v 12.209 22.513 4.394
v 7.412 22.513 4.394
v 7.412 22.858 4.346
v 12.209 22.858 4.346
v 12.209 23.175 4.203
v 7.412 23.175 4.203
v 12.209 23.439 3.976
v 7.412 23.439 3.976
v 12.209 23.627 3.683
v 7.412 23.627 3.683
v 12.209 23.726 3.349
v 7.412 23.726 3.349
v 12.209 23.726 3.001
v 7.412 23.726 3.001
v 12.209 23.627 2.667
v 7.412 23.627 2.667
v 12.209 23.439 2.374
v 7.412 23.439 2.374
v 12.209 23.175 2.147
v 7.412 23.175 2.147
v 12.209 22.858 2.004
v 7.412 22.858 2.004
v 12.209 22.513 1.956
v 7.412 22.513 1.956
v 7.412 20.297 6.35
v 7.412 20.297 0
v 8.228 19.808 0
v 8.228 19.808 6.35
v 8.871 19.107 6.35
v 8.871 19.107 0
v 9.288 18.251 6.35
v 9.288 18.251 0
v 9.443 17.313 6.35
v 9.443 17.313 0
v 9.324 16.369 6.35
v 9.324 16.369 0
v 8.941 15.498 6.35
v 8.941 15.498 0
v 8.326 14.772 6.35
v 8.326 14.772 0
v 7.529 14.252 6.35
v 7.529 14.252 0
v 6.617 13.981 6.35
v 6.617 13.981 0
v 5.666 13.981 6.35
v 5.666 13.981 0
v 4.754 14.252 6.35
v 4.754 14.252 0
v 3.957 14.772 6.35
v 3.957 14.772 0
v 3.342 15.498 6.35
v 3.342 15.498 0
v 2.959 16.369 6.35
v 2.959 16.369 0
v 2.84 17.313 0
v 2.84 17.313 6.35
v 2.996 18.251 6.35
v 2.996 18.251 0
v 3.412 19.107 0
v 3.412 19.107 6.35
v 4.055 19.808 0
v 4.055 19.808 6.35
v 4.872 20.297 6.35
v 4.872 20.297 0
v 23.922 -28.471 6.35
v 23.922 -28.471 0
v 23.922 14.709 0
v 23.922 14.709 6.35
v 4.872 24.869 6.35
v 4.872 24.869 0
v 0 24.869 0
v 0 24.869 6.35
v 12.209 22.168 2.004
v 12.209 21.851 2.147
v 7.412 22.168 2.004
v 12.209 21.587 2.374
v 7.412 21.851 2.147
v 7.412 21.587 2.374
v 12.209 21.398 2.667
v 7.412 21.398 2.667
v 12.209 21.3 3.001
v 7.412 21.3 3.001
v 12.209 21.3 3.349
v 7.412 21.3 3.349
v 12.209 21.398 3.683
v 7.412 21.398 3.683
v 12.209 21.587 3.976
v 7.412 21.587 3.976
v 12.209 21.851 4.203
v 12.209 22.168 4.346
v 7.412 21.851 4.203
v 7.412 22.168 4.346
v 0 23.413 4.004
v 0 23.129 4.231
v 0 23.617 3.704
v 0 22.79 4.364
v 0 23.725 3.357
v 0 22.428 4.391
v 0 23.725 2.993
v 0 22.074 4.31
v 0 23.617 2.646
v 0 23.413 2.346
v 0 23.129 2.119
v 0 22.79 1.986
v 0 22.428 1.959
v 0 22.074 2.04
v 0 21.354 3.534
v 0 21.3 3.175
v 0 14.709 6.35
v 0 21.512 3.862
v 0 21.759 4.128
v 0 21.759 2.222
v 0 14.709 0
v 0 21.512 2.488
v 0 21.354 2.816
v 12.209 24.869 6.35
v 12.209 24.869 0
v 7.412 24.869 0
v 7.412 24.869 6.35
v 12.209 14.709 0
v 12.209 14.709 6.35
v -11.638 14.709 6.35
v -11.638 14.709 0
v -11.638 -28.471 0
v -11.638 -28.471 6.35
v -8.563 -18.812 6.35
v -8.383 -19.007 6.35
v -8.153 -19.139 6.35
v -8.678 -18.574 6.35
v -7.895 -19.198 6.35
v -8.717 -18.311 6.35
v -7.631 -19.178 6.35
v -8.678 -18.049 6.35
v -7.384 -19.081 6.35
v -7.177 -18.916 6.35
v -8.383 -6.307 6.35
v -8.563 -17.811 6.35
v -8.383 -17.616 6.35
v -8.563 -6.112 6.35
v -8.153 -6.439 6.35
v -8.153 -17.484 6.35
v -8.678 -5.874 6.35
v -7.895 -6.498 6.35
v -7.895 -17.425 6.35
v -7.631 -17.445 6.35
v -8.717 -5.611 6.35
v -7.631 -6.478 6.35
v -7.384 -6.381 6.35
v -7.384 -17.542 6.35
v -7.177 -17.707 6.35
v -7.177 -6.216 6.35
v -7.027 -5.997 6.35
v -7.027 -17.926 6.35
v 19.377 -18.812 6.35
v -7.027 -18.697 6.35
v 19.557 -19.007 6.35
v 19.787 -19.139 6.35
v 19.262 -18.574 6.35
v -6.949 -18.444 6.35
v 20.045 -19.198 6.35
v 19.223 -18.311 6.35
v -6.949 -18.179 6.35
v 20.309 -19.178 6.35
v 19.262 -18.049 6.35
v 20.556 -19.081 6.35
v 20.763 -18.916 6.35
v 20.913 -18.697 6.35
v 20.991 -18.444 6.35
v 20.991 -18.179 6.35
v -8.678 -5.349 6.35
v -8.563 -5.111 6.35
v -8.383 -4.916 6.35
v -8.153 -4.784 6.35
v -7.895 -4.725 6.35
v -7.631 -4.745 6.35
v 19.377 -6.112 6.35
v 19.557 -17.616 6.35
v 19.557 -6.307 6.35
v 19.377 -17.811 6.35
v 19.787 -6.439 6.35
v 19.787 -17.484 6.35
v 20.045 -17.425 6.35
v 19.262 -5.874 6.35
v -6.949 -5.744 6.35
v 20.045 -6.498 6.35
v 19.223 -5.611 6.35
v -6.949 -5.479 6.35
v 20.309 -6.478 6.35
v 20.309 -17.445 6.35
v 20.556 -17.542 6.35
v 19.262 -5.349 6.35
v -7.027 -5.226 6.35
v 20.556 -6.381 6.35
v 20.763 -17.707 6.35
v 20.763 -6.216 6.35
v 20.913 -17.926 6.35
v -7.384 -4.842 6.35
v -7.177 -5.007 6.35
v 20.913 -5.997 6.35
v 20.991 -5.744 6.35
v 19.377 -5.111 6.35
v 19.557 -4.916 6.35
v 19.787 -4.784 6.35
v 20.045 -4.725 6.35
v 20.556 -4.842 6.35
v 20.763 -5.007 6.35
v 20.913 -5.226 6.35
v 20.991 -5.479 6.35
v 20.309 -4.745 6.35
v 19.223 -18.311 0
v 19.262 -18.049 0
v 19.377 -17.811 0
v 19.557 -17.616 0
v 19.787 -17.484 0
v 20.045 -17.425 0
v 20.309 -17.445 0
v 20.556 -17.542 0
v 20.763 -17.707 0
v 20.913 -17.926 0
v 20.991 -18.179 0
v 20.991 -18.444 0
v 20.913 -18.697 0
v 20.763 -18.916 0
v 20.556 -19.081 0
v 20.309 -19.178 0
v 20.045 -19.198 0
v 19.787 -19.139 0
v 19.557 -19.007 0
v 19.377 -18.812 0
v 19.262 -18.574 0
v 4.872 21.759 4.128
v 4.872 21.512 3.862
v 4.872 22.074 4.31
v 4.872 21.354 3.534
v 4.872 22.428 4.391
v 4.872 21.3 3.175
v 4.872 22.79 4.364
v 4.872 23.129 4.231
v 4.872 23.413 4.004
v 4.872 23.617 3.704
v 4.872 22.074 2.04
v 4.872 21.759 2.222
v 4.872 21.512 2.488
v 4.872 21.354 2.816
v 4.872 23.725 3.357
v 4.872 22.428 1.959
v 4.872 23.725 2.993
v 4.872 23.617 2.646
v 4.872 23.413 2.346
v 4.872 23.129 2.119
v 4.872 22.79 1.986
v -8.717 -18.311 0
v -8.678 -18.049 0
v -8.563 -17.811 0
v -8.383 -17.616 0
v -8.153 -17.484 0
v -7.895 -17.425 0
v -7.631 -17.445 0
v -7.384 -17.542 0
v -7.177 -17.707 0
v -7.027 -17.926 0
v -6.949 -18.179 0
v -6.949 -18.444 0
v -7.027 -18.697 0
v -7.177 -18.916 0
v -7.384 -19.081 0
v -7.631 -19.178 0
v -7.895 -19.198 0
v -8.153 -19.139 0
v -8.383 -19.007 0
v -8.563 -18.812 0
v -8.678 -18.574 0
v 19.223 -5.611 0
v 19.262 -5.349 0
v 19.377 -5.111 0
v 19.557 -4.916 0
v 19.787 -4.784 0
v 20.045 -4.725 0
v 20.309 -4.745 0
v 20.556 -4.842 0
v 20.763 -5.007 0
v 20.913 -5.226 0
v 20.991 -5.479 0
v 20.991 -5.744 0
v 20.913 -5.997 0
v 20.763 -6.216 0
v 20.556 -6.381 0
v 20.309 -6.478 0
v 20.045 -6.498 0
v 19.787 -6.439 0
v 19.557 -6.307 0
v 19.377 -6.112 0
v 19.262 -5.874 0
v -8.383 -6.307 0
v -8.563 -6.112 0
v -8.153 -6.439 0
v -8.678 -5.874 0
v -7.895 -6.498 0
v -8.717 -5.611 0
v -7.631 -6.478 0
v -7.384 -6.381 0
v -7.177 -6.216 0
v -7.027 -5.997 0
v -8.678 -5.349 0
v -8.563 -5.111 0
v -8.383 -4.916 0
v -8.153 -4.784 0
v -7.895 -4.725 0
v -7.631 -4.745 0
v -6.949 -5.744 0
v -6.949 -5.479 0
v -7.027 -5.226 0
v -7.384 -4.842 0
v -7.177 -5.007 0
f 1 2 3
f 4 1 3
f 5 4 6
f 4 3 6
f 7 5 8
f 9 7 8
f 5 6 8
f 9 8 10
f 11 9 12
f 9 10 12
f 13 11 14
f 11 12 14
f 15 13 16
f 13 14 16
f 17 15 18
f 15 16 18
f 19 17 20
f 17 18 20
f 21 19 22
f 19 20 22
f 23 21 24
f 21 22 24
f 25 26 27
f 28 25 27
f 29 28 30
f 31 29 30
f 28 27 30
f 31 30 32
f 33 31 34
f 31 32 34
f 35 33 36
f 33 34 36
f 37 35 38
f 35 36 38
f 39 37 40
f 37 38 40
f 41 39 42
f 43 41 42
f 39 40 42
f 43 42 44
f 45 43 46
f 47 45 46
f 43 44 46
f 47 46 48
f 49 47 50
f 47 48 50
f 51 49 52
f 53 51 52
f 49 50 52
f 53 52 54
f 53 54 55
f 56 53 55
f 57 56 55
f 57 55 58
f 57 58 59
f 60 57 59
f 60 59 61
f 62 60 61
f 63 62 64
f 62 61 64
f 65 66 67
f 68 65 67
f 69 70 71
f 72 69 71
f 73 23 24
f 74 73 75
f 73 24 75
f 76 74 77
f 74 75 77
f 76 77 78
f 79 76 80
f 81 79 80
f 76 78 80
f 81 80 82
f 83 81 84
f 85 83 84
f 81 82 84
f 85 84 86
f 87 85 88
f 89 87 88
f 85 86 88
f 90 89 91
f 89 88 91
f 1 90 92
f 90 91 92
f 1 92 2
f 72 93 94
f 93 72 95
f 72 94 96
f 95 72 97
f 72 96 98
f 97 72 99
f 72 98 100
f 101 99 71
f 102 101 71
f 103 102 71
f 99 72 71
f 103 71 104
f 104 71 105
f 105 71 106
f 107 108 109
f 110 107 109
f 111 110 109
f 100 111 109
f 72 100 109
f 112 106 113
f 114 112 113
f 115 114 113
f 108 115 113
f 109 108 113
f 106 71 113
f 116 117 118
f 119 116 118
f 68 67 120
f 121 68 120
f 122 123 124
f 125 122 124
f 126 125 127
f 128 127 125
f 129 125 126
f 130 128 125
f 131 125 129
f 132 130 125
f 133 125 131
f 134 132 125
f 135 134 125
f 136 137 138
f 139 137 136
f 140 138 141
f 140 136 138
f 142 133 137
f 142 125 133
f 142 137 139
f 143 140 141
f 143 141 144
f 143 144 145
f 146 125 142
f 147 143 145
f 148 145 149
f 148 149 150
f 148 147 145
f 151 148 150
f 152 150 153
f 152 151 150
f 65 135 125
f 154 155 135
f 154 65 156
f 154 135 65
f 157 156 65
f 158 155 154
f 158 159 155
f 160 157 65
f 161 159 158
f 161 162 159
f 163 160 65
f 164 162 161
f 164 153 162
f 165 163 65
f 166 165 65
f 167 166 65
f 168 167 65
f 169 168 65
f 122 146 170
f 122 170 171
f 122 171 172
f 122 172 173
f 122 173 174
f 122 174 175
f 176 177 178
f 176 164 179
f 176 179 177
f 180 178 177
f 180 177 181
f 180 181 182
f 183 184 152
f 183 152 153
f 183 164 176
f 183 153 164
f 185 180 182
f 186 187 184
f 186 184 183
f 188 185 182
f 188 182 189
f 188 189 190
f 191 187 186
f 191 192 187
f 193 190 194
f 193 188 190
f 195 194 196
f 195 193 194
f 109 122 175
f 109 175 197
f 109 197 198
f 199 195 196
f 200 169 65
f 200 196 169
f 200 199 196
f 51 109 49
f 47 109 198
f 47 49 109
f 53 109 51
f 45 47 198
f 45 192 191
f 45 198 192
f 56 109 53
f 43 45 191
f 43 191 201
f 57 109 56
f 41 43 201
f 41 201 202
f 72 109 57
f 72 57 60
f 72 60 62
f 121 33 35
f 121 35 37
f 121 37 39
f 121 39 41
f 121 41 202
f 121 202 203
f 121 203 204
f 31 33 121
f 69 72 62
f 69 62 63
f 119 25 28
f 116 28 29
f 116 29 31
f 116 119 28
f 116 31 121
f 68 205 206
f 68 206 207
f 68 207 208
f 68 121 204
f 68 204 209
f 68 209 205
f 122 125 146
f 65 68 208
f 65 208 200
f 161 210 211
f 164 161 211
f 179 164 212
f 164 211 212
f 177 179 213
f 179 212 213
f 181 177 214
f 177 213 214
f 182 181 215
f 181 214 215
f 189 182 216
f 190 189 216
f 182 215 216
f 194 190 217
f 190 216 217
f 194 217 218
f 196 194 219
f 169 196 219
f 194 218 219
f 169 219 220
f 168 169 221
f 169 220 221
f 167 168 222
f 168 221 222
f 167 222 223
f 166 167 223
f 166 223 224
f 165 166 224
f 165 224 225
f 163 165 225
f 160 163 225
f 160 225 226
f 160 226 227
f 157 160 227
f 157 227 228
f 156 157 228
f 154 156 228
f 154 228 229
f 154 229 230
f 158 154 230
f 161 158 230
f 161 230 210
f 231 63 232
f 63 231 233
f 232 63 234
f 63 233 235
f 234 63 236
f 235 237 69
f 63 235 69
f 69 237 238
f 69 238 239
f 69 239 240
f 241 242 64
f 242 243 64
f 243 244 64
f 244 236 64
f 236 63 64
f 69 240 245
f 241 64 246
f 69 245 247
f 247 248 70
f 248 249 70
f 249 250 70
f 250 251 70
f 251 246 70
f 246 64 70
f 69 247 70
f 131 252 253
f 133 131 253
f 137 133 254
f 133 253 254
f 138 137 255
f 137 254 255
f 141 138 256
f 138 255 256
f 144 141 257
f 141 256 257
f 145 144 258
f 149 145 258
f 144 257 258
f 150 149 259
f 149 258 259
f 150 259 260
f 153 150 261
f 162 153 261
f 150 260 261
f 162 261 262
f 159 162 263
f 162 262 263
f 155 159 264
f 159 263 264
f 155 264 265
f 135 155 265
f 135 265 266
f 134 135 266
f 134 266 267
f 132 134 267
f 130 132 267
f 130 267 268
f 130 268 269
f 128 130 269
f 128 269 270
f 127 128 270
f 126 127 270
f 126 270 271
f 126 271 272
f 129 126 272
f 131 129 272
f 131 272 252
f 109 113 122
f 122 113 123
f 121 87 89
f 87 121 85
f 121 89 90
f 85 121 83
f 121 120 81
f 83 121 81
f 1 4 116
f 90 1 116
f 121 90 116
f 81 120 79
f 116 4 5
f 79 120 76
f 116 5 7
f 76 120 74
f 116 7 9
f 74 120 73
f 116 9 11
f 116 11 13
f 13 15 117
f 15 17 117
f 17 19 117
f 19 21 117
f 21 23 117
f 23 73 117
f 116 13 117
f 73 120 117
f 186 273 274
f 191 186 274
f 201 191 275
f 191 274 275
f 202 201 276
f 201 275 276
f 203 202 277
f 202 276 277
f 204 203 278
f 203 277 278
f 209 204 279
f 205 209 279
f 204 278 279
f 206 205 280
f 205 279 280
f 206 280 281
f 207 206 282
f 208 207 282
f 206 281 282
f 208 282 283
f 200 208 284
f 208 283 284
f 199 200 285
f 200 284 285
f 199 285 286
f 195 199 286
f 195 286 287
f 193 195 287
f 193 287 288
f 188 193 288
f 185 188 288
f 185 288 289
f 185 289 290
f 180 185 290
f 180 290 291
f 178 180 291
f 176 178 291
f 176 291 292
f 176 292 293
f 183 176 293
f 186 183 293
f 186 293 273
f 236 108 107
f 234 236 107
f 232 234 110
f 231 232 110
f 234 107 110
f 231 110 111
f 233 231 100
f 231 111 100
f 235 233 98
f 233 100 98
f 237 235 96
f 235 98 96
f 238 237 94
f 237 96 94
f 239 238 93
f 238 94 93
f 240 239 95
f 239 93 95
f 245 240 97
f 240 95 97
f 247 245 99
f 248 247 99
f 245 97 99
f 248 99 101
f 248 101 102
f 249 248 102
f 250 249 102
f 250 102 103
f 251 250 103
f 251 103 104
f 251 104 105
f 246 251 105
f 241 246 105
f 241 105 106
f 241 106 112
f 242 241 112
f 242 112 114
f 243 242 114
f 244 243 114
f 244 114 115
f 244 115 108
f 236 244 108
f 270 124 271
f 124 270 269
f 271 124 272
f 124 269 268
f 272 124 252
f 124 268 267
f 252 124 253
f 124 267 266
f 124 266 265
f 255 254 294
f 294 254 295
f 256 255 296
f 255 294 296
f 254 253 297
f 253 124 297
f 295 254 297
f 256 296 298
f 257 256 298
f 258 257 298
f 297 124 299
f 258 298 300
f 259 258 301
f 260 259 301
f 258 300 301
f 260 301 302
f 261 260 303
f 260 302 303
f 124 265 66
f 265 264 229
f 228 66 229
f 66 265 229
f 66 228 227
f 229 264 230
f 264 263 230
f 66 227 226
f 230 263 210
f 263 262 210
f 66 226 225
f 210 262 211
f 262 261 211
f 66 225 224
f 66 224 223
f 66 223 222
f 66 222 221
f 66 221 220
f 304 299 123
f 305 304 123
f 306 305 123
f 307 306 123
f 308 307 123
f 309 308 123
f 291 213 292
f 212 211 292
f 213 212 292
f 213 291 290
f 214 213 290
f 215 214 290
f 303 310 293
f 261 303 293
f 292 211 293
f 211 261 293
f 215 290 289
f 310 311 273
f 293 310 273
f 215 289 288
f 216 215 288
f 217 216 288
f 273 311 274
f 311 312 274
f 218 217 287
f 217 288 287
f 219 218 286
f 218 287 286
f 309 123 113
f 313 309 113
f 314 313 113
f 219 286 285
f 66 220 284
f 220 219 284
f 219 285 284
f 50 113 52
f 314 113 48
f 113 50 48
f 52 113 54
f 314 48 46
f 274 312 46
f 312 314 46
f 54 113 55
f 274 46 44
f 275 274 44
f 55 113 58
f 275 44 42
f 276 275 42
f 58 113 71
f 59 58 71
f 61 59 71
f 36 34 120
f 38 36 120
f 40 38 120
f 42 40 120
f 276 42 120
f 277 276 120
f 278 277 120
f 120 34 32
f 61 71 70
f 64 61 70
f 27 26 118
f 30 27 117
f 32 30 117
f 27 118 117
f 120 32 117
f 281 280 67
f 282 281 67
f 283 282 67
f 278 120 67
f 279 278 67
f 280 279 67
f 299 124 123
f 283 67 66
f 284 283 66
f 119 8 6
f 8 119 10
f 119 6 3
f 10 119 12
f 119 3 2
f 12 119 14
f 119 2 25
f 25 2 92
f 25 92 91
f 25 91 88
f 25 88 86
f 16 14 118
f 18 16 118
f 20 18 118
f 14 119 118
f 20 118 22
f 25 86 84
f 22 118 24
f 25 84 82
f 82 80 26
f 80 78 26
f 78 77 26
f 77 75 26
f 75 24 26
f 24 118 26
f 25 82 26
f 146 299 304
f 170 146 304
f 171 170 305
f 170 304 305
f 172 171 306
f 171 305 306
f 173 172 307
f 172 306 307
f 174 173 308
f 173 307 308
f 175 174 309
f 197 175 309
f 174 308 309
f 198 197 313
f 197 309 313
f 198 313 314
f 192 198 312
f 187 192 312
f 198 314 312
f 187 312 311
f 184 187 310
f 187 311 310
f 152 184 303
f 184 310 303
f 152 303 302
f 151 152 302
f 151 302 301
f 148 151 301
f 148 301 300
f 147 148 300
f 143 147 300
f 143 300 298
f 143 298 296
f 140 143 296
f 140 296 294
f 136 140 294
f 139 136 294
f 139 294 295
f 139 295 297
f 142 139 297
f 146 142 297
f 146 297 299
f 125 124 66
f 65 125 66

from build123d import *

# Parameters (mm, degrees)
F1_DEPTH = 6.35
F3_D     = 1.778
F5_D     = 2.4384
F5_DEPTH = 5.08
F5_TIP   = 0.7325692667
F7_D     = 2.4384
F7_DEPTH = 25.4
F7_START = 7.3375843
F7_TIP   = 0.7325692667


with BuildPart() as f1:
    # F0 (on Top) → F1 (new body)
    with BuildSketch(Plane.XY):
        with BuildLine():
            Line((0, 14.708516188), (-11.6383890907, 14.708516188))
            Line((-11.6383890907, 14.708516188), (-11.6383890907, -28.471483812))
            Line((-11.6383890907, -28.471483812), (23.9216109093, -28.471483812))
            Line((23.9216109093, -28.471483812), (23.9216109093, 14.708516188))
            Line((23.9216109093, 14.708516188), (12.2091952547, 14.708516188))
            Line((12.2091952547, 14.708516188), (12.2091952547, 24.868516188))
            Line((12.2091952547, 24.868516188), (7.4116109093, 24.868516188))
            Line((7.4116109093, 24.868516188), (7.4116109093, 20.296516188))
            ThreePointArc((7.4116109093, 20.296516188), (6.1416109093, 13.946516188), (4.8716109093, 20.296516188))
            Line((4.8716109093, 20.296516188), (4.8716109093, 24.868516188))
            Line((4.8716109093, 24.868516188), (0, 24.868516188))
            Line((0, 24.868516188), (0, 14.708516188))
        make_face()
    extrude(amount=F1_DEPTH)

    # F3 (through all)
    with Locations(Plane.XY.offset(6.35)):
        with Locations((-7.8283890907, -5.611483812), (20.1116109093, -5.611483812), (20.1116109093, -18.311483812), (-7.8283890907, -18.311483812)):
            Hole(F3_D / 2)

    # F5
    with Locations(Plane.YZ.offset(12.2091952547)):
        with Locations((22.506316188, 3.175)):
            Hole(F5_D / 2, depth=F5_DEPTH)
            with Locations((0, 0, -(F5_DEPTH + F5_TIP / 2))):  # 118° drill point
                Cone(0, F5_D / 2, F5_TIP, mode=Mode.SUBTRACT)

    # F7
    # its depths count from where the whole tool has entered the part; down to there all is cleared
    with Locations(Plane.YZ.offset(12.2091952547).offset(-F7_START)):
        with Locations((22.519016188, 3.175)):
            Hole(F7_D / 2, depth=F7_DEPTH)
            with Locations((0, 0, -(F7_DEPTH + F7_TIP / 2))):  # 118° drill point
                Cone(0, F7_D / 2, F7_TIP, mode=Mode.SUBTRACT)


solid = f1.part
